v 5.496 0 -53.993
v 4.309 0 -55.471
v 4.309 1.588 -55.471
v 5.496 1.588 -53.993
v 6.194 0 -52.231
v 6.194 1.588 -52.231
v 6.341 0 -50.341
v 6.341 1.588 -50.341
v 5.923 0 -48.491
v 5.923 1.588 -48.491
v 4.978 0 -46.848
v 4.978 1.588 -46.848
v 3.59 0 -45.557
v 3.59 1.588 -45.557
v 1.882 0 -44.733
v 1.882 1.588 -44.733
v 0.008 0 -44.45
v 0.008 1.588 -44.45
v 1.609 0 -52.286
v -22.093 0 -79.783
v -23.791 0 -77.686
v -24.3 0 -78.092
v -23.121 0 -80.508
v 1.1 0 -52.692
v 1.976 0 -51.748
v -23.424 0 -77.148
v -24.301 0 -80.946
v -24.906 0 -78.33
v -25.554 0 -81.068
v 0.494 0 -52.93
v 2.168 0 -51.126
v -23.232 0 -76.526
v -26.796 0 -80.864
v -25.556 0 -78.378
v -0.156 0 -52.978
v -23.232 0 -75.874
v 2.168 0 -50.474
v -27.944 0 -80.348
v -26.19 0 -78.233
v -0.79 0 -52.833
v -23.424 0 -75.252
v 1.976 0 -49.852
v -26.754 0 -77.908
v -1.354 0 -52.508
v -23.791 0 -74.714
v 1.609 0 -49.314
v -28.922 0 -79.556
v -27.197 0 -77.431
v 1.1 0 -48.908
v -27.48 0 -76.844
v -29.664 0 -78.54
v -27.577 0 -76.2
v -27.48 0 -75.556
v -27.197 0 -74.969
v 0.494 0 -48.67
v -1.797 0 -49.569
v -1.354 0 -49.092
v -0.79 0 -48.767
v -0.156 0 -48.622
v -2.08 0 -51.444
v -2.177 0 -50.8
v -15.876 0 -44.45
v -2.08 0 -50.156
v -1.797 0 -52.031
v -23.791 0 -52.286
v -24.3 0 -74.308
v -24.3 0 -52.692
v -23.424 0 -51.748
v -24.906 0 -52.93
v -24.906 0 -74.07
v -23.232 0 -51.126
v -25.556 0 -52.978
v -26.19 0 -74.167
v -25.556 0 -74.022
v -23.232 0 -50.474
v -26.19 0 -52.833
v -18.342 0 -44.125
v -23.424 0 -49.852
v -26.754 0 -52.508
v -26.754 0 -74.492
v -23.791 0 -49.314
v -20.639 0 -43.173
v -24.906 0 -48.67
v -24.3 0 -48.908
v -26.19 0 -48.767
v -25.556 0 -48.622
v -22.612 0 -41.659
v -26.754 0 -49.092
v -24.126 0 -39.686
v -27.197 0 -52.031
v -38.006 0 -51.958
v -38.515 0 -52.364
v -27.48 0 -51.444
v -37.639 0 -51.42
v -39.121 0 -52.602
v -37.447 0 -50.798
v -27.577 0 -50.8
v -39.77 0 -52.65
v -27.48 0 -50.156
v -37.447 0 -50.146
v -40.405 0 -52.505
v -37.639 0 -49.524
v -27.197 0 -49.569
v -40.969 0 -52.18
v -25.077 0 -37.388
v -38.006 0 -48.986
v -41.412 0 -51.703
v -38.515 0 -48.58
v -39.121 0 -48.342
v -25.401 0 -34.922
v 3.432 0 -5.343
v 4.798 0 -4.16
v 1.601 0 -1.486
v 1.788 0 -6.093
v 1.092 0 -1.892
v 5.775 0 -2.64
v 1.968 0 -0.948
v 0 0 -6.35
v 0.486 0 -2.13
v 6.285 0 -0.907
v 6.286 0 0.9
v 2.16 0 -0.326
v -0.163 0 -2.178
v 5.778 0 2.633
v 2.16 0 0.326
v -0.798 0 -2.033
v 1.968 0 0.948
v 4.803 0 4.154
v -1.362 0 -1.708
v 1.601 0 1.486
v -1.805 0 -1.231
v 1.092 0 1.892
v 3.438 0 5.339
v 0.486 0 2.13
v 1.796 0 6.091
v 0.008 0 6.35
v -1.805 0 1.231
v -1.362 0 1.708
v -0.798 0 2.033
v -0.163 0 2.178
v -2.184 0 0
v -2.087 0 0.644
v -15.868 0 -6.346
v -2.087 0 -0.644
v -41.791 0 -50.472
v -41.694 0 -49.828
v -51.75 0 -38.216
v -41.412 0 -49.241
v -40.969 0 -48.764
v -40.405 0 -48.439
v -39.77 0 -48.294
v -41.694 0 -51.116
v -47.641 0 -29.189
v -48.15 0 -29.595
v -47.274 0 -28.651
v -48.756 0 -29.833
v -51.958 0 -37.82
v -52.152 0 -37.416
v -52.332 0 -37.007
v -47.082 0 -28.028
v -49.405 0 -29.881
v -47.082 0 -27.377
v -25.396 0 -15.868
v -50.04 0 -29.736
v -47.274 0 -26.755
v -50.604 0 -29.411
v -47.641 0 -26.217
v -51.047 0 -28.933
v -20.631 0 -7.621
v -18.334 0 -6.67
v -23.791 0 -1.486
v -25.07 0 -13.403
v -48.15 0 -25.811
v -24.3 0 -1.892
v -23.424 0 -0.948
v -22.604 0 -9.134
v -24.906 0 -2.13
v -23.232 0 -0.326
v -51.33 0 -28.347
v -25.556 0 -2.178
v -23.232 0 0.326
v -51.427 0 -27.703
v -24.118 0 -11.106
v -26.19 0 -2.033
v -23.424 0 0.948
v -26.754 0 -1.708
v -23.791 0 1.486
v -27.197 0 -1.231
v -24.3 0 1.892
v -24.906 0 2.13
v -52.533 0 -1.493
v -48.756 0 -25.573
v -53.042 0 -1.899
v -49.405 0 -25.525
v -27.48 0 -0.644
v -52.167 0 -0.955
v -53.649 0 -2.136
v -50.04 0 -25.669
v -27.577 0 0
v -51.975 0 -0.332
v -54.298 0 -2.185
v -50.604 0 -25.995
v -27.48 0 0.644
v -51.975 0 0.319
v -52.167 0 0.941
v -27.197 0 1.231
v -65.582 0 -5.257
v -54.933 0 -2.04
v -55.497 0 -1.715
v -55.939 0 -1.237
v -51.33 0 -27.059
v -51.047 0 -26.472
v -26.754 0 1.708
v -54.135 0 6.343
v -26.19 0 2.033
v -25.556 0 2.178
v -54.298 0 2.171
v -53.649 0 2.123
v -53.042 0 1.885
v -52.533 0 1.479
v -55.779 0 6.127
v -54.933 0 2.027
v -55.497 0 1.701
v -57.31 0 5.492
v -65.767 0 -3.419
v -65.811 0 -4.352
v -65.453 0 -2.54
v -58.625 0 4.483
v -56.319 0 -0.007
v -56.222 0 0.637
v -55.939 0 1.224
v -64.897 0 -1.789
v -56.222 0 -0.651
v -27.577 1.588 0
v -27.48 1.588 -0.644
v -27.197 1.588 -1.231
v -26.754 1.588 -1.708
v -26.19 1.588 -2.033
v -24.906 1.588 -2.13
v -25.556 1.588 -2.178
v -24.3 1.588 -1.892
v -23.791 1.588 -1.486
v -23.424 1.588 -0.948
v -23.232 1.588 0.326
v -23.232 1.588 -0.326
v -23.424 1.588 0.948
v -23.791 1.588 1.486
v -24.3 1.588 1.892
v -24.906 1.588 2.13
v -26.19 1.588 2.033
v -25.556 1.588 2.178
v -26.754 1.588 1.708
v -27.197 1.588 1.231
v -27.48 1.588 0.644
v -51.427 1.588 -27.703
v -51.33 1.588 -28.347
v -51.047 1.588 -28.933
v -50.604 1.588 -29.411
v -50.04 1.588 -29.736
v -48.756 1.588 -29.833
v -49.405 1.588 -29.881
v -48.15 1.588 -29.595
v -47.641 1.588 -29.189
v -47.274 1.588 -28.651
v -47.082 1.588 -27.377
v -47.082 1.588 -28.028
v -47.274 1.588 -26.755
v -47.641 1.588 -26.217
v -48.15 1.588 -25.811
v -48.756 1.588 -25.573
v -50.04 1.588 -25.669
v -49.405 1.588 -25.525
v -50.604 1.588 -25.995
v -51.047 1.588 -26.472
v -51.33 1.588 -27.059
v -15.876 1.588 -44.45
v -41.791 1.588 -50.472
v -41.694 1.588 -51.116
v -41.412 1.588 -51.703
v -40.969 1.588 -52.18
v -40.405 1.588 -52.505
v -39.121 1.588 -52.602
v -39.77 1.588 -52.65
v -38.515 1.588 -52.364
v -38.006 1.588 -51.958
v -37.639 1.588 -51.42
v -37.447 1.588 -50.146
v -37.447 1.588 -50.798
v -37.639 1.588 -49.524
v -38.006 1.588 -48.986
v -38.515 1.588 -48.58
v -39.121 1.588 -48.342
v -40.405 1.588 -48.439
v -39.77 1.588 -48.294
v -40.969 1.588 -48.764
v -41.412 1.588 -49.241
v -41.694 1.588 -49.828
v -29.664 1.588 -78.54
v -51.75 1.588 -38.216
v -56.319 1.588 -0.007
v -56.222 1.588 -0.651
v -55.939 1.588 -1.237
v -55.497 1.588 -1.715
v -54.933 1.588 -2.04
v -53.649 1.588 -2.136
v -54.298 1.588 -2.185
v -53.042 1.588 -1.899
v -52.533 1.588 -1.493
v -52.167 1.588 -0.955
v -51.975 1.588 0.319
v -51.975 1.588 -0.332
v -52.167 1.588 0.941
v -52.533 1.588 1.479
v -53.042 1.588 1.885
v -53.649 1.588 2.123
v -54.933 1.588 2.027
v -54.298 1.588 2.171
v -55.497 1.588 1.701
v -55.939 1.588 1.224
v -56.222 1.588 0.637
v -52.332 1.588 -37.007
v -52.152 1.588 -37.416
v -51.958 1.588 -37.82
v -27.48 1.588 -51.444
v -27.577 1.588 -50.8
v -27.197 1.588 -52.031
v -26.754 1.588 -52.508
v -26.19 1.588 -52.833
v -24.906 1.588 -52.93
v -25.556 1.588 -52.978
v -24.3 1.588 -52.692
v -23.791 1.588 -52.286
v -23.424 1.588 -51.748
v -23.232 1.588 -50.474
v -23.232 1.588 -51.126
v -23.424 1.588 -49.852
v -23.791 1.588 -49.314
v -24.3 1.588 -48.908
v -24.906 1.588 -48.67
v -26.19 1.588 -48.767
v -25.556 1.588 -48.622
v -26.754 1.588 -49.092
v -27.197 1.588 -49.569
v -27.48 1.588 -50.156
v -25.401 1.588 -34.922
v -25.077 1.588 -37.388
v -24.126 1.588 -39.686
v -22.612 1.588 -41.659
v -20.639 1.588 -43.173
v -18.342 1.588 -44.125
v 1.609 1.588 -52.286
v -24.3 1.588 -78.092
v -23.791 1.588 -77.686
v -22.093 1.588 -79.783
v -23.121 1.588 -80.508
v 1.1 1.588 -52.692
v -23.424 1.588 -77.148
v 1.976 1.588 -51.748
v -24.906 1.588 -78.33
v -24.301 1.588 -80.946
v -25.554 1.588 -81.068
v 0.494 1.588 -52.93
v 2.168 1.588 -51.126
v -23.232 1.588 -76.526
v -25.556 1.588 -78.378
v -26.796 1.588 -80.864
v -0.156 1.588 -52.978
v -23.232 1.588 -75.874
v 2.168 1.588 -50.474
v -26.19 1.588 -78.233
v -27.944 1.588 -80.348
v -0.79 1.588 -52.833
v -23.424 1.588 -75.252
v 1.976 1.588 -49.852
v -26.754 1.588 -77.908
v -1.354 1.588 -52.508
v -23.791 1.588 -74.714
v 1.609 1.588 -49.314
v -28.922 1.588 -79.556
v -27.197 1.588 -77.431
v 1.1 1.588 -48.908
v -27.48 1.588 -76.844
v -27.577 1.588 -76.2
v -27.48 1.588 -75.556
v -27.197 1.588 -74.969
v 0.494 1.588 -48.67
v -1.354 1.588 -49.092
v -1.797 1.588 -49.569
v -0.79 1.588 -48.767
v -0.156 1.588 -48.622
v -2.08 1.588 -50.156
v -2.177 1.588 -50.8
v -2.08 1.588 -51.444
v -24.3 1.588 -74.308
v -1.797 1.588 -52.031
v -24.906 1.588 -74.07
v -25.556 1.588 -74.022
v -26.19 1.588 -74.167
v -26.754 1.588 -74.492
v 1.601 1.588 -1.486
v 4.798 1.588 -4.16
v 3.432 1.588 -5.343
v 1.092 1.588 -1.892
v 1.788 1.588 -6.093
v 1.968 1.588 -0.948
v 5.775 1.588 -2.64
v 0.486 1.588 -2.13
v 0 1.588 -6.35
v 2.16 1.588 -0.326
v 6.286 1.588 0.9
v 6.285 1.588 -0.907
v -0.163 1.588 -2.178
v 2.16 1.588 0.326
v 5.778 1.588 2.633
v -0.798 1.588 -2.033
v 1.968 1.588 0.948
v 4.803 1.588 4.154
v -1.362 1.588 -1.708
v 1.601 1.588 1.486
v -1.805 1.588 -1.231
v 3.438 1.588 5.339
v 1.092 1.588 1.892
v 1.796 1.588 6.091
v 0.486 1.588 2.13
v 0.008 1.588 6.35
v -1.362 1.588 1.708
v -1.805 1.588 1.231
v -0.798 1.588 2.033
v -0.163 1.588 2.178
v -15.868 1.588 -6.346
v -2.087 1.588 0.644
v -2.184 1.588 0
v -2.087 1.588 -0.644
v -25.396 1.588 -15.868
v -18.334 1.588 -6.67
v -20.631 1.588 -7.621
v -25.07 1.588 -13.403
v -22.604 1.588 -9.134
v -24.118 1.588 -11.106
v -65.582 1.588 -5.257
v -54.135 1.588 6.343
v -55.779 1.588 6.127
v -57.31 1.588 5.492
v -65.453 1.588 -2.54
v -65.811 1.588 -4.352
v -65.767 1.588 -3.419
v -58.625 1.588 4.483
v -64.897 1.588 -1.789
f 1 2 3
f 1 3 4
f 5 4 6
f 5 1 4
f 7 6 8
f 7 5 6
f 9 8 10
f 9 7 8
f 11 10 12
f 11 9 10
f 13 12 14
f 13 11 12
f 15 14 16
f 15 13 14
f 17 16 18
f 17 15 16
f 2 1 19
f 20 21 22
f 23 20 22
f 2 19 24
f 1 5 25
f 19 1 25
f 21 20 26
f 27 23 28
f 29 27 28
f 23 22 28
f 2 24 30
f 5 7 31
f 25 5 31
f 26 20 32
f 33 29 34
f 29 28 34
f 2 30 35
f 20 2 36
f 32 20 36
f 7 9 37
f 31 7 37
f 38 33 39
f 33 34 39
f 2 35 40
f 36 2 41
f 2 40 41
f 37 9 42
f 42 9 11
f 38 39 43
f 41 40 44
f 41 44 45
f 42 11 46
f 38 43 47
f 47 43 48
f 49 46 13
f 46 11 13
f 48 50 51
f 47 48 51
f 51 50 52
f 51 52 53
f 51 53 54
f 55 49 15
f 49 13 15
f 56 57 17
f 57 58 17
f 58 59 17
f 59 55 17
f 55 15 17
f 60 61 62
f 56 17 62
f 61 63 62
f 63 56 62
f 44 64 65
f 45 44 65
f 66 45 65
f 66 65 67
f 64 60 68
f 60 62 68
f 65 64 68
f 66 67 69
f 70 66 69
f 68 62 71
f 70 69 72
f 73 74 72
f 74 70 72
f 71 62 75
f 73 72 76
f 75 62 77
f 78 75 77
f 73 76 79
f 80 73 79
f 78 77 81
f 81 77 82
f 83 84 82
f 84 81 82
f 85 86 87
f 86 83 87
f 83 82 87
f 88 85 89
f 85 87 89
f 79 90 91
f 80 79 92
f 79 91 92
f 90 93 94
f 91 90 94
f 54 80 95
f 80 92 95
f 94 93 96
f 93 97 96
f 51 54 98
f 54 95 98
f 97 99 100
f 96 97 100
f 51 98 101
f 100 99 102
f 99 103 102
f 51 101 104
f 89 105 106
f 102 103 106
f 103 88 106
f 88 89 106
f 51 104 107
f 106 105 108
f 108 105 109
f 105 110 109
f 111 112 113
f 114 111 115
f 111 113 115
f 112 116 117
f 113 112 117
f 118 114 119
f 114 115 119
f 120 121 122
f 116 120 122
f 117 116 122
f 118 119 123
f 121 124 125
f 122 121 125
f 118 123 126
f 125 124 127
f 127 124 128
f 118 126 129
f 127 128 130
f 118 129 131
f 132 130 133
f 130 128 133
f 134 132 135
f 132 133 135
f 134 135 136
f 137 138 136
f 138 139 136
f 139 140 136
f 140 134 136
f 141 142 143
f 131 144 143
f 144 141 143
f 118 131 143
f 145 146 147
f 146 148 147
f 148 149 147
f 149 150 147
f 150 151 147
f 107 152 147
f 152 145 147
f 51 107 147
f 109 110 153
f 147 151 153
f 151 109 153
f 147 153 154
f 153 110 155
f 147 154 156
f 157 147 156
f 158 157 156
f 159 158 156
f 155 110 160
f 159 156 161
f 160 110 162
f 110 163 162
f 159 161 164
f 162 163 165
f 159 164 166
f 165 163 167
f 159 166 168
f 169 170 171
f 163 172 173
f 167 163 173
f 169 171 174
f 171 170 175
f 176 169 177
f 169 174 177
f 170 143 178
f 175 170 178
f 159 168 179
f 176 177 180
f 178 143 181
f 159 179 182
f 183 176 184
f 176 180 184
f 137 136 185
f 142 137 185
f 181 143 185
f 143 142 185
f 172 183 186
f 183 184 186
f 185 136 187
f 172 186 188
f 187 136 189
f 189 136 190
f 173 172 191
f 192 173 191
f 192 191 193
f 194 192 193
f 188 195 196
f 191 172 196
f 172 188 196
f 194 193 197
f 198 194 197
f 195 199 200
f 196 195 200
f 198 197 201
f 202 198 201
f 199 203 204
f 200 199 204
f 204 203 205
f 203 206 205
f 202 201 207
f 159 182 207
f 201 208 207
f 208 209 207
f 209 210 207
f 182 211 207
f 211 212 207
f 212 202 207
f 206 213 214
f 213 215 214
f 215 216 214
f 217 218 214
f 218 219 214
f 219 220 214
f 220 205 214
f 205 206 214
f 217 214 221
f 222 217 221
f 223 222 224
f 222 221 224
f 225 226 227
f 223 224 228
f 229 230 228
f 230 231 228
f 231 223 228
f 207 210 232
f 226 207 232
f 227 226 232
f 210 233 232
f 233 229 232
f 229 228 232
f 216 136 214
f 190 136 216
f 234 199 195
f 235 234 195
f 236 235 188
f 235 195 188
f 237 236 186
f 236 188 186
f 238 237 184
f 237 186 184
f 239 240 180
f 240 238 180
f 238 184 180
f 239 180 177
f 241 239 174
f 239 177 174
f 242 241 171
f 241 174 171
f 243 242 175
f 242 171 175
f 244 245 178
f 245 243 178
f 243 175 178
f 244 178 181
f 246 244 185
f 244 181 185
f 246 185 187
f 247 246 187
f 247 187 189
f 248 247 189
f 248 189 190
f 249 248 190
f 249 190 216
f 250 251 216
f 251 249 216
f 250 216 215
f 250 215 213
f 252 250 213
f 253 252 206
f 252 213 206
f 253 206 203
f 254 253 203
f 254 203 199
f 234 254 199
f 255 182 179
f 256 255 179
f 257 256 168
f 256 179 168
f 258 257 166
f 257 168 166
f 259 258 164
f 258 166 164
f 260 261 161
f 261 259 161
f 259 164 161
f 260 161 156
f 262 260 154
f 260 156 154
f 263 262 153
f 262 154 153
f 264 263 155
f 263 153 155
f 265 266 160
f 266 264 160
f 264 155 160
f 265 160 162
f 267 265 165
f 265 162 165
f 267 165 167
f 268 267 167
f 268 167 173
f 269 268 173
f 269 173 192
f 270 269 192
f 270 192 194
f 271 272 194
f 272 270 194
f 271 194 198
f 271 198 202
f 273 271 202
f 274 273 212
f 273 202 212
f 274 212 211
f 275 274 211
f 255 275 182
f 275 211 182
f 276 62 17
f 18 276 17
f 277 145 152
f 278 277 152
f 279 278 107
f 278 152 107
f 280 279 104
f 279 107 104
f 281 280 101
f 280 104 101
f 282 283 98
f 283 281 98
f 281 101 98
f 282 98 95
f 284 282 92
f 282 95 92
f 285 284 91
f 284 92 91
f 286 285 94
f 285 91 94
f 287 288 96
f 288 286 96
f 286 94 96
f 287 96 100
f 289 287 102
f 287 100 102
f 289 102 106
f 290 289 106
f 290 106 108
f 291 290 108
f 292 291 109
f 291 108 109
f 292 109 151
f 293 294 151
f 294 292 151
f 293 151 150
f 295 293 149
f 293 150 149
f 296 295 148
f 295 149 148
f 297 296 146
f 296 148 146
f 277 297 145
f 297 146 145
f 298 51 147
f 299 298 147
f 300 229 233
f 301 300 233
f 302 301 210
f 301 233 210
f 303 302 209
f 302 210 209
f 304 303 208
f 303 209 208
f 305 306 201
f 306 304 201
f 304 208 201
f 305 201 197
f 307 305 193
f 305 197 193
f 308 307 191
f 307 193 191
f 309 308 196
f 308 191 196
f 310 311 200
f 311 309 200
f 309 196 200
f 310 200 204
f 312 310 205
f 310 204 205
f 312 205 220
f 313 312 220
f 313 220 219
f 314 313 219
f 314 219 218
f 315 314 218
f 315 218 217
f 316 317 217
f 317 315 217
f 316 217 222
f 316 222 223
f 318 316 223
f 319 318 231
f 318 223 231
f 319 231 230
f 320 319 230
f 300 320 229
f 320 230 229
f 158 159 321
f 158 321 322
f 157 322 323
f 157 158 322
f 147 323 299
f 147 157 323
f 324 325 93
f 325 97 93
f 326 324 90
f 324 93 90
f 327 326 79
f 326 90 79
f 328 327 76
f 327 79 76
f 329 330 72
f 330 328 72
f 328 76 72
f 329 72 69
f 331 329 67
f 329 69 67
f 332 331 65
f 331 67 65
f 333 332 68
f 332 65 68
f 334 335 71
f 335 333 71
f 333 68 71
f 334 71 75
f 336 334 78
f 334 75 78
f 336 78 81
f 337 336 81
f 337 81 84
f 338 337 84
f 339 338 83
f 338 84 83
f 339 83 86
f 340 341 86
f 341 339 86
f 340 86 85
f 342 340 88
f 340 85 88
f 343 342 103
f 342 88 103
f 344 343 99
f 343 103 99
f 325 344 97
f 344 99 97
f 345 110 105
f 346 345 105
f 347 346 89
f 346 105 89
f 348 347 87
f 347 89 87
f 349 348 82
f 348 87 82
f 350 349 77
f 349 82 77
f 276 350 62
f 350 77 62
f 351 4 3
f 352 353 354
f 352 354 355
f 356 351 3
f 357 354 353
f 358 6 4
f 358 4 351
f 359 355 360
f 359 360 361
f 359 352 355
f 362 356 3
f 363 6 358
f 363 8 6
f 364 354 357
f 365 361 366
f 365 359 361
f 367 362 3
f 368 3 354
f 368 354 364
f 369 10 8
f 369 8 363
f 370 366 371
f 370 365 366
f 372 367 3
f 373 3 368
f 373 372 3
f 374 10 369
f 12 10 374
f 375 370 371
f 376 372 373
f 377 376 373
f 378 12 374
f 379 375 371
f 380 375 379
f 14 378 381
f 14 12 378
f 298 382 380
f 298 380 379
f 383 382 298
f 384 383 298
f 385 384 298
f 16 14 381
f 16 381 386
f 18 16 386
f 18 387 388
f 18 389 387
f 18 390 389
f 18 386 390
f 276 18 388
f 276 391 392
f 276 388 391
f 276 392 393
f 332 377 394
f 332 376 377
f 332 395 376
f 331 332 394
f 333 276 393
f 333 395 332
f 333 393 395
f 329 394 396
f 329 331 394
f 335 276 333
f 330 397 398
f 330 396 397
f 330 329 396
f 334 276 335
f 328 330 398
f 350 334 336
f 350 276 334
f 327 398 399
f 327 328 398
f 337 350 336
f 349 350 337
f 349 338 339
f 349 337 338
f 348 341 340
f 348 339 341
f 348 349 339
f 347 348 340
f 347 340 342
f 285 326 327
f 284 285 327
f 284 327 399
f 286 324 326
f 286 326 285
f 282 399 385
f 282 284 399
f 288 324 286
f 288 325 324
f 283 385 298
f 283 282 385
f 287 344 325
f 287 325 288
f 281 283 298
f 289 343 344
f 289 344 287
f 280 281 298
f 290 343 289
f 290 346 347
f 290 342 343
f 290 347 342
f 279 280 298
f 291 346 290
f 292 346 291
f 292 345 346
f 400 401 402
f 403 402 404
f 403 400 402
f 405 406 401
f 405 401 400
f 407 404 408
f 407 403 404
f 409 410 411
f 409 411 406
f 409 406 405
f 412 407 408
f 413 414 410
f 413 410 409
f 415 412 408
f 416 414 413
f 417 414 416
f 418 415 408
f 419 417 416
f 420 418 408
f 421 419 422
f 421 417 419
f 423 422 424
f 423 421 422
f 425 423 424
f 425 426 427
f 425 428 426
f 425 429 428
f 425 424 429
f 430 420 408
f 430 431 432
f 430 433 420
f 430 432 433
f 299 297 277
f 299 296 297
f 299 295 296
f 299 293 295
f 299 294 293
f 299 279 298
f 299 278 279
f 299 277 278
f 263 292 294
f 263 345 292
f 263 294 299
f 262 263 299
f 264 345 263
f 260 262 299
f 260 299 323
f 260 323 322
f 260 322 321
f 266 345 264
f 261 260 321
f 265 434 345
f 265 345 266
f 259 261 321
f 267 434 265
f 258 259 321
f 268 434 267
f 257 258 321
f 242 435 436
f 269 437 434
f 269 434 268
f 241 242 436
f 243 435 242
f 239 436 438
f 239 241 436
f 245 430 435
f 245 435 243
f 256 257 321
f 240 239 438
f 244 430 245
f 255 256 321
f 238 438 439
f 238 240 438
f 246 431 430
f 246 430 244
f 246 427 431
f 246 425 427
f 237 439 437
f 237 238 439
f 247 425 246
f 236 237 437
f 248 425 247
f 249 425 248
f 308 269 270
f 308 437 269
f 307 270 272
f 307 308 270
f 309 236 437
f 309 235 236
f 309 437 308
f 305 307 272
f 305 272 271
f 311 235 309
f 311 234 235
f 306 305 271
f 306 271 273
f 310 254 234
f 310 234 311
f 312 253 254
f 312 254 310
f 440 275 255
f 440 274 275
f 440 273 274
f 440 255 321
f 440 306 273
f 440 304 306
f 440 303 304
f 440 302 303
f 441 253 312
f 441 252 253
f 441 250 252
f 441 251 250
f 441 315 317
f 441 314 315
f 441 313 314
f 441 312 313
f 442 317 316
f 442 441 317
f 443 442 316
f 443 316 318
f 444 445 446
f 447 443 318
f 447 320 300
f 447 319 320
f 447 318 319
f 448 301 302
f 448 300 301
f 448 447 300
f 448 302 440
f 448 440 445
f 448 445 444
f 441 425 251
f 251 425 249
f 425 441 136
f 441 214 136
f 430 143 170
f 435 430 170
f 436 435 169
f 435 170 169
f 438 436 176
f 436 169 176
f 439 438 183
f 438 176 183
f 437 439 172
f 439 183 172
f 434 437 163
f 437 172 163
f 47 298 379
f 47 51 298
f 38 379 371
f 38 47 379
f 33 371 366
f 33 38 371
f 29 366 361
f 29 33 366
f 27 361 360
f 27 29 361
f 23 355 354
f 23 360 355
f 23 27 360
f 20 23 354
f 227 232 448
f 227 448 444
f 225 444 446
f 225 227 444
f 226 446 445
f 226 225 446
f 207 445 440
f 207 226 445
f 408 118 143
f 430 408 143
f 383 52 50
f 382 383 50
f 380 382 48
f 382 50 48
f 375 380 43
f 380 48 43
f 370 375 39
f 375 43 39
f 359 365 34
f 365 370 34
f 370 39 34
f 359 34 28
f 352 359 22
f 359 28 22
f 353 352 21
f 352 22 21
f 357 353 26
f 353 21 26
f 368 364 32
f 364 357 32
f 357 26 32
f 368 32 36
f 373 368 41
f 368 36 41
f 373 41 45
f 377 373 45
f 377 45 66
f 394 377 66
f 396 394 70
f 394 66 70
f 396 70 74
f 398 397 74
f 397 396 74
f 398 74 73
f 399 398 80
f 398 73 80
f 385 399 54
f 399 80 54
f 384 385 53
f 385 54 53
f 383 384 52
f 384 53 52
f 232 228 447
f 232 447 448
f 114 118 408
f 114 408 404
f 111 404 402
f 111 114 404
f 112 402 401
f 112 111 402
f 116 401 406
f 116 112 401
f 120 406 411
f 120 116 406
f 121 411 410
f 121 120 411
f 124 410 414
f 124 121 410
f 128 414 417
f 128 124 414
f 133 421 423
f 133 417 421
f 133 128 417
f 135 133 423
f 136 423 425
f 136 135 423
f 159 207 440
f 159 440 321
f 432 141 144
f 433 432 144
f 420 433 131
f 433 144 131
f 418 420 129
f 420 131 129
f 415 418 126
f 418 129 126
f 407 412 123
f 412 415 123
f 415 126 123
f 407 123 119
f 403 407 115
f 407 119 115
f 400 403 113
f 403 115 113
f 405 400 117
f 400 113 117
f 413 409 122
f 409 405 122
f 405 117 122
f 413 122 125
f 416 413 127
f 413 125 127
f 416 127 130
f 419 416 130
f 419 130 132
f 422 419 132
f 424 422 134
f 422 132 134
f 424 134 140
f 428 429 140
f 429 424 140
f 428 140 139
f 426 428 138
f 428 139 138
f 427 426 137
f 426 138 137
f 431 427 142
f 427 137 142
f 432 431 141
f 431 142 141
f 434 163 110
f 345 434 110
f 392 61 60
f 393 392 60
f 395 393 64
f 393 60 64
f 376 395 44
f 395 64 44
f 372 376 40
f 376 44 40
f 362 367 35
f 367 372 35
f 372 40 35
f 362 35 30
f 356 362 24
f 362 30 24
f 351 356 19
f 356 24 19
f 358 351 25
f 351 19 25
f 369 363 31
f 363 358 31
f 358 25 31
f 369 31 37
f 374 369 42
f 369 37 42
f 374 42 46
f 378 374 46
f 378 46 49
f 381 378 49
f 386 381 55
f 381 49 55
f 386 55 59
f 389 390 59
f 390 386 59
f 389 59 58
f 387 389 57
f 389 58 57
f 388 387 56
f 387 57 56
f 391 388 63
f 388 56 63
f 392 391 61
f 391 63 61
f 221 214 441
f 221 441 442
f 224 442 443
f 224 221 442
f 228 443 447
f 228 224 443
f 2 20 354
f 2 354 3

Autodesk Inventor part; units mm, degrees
ref_plane "YZ Plane" through (0, 0, 0) normal (1, 0, 0) x (0, 1, 0)
ref_plane "XZ Plane" through (0, 0, 0) normal (0, 1, 0) x (-1, 0, 0)
ref_plane "XY Plane" through (0, 0, 0) normal (0, 0, 1) x (1, 0, 0)
sketch "main" plane through (0, 0, 0) normal (0, 0, 1) x (1, 0, 0)
  line L0 (12.0188, -14.2552) -> (34.1049, 26.0684)
  circle A0 centre (21.9619, 13.8124) radius 2.1844
  circle A1 centre (31.5972, 36.5815) radius 2.1844
  circle A2 centre (36.4896, 64.2776) radius 2.1844
  line L1 (36.4904, 70.6276) -> (-17.6528, 70.6344)
  circle A3 centre (7.7473, 64.2844) radius 2.1844
  line L2 (7.7507, 48.4162) -> (7.7558, 29.3619)
  arc A4 (7.7507, 48.4162) -> (-1.7768, 57.9386) centre (-1.7743, 48.4136) ccw
  arc A5 (-1.7692, 19.8344) -> (7.7558, 29.3619) centre (-1.7692, 29.3594) ccw
  line L3 (-17.645, 57.9344) -> (-1.7768, 57.9386)
  arc A6 (-17.6528, 70.6344) -> (-17.645, 57.9344) centre (-17.645, 64.2844) ccw
  arc A7 (-17.6527, 19.8344) -> (-21.9541, 8.8131) centre (-17.6527, 13.4844) ccw
  circle A8 centre (7.7473, 13.4844) radius 2.1844
  line L4 (-1.7692, 19.8344) -> (-17.6527, 19.8344)
  arc A9 (4.4483, -15.4983) -> (12.0188, -14.2552) centre (7.7473, -11.9156) ccw
  line L5 (4.4483, -15.4983) -> (-21.9541, 8.8131)
  circle A10 centre (7.7473, -11.9156) radius 2.1844
  circle A11 centre (-17.645, 64.2844) radius 2.1844
  circle A12 centre (-17.6527, 13.4844) radius 2.1844
  arc A13 (40.98, 68.7674) -> (36.4904, 70.6276) centre (36.4896, 64.2776) ccw
  line L6 (40.98, 68.7674) -> (47.2524, 62.495)
  line L7 (40.98, 68.7674) -> (49.8505, 68.7674) construction
  line L8 (47.9374, 59.0271) -> (34.6865, 27.2778)
  arc A14 (34.1049, 26.0684) -> (34.6865, 27.2778) centre (22.9663, 32.1693) ccw
  arc A15 (47.9374, 59.0271) -> (47.2524, 62.495) centre (45.0073, 60.25) ccw
  point P0 (10.5119, 26.5593)
  point P1 (34.4277, 26.6577)
  dimension "d1" = 9.7405
  dimension "d2" = 4.3688
  dimension "d3" = 4.3688
  dimension "d4" = 4.3688
  dimension "d5" = 4.3688
  dimension "d6" = 4.3688
  dimension "d10" = 50.8
  dimension "d11" = 50.8
  dimension "d13" = 6.35
  dimension "d20" = 45
  dimension "d21" = 12.7
  dimension "d22" = 3.175
sketch "Sketch1" plane through (0, 0, 0) normal (0, 1, 0) x (-1, 0, 0)
  line L0 (29.6638, -78.5396) -> (51.75, -38.2159)
  circle A0 centre (39.607, -50.472) radius 2.1844
  circle A1 centre (49.2422, -27.7029) radius 2.1844
  circle A2 centre (54.1346, -0.0068) radius 2.1844
  line L1 (54.1354, 6.3432) -> (-0.0077, 6.35)
  circle A3 centre (25.3923, 0) radius 2.1844
  line L2 (25.3957, -15.8682) -> (25.4009, -34.9224)
  arc A4 (25.3957, -15.8682) -> (15.8682, -6.3457) centre (15.8707, -15.8707) ccw
  arc A5 (15.8759, -44.45) -> (25.4009, -34.9224) centre (15.8759, -34.925) ccw
  line L3 (0, -6.35) -> (15.8682, -6.3457)
  arc A6 (-0.0077, 6.35) -> (0, -6.35) centre (0, 0) ccw
  arc A7 (-0.0077, -44.45) -> (-4.309, -55.4713) centre (-0.0077, -50.8) ccw
  circle A8 centre (25.3923, -50.8) radius 2.1844
  line L4 (15.8759, -44.45) -> (-0.0077, -44.45)
  arc A9 (22.0933, -79.7827) -> (29.6638, -78.5396) centre (25.3923, -76.2) ccw
  line L5 (22.0933, -79.7827) -> (-4.309, -55.4713)
  circle A10 centre (25.3923, -76.2) radius 2.1844
  circle A11 centre (0, 0) radius 2.1844
  circle A12 centre (-0.0077, -50.8) radius 2.1844
  arc A13 (58.625, 4.483) -> (54.1354, 6.3432) centre (54.1346, -0.0068) ccw
  line L6 (58.625, 4.483) -> (64.8974, -1.7894)
  line L7 (58.625, 4.483) -> (67.4955, 4.483) construction
  line L8 (65.5824, -5.2573) -> (52.3315, -37.0066)
  arc A14 (51.75, -38.2159) -> (52.3315, -37.0066) centre (40.6113, -32.1151) ccw
  arc A15 (65.5824, -5.2573) -> (64.8974, -1.7894) centre (62.6524, -4.0344) ccw
extrude "Extrusion1" add sketch "Sketch1" along normal blind 1.5875
properties part number "Funnel Gusset Back Improved V2" material "Acetal Resin, White"
